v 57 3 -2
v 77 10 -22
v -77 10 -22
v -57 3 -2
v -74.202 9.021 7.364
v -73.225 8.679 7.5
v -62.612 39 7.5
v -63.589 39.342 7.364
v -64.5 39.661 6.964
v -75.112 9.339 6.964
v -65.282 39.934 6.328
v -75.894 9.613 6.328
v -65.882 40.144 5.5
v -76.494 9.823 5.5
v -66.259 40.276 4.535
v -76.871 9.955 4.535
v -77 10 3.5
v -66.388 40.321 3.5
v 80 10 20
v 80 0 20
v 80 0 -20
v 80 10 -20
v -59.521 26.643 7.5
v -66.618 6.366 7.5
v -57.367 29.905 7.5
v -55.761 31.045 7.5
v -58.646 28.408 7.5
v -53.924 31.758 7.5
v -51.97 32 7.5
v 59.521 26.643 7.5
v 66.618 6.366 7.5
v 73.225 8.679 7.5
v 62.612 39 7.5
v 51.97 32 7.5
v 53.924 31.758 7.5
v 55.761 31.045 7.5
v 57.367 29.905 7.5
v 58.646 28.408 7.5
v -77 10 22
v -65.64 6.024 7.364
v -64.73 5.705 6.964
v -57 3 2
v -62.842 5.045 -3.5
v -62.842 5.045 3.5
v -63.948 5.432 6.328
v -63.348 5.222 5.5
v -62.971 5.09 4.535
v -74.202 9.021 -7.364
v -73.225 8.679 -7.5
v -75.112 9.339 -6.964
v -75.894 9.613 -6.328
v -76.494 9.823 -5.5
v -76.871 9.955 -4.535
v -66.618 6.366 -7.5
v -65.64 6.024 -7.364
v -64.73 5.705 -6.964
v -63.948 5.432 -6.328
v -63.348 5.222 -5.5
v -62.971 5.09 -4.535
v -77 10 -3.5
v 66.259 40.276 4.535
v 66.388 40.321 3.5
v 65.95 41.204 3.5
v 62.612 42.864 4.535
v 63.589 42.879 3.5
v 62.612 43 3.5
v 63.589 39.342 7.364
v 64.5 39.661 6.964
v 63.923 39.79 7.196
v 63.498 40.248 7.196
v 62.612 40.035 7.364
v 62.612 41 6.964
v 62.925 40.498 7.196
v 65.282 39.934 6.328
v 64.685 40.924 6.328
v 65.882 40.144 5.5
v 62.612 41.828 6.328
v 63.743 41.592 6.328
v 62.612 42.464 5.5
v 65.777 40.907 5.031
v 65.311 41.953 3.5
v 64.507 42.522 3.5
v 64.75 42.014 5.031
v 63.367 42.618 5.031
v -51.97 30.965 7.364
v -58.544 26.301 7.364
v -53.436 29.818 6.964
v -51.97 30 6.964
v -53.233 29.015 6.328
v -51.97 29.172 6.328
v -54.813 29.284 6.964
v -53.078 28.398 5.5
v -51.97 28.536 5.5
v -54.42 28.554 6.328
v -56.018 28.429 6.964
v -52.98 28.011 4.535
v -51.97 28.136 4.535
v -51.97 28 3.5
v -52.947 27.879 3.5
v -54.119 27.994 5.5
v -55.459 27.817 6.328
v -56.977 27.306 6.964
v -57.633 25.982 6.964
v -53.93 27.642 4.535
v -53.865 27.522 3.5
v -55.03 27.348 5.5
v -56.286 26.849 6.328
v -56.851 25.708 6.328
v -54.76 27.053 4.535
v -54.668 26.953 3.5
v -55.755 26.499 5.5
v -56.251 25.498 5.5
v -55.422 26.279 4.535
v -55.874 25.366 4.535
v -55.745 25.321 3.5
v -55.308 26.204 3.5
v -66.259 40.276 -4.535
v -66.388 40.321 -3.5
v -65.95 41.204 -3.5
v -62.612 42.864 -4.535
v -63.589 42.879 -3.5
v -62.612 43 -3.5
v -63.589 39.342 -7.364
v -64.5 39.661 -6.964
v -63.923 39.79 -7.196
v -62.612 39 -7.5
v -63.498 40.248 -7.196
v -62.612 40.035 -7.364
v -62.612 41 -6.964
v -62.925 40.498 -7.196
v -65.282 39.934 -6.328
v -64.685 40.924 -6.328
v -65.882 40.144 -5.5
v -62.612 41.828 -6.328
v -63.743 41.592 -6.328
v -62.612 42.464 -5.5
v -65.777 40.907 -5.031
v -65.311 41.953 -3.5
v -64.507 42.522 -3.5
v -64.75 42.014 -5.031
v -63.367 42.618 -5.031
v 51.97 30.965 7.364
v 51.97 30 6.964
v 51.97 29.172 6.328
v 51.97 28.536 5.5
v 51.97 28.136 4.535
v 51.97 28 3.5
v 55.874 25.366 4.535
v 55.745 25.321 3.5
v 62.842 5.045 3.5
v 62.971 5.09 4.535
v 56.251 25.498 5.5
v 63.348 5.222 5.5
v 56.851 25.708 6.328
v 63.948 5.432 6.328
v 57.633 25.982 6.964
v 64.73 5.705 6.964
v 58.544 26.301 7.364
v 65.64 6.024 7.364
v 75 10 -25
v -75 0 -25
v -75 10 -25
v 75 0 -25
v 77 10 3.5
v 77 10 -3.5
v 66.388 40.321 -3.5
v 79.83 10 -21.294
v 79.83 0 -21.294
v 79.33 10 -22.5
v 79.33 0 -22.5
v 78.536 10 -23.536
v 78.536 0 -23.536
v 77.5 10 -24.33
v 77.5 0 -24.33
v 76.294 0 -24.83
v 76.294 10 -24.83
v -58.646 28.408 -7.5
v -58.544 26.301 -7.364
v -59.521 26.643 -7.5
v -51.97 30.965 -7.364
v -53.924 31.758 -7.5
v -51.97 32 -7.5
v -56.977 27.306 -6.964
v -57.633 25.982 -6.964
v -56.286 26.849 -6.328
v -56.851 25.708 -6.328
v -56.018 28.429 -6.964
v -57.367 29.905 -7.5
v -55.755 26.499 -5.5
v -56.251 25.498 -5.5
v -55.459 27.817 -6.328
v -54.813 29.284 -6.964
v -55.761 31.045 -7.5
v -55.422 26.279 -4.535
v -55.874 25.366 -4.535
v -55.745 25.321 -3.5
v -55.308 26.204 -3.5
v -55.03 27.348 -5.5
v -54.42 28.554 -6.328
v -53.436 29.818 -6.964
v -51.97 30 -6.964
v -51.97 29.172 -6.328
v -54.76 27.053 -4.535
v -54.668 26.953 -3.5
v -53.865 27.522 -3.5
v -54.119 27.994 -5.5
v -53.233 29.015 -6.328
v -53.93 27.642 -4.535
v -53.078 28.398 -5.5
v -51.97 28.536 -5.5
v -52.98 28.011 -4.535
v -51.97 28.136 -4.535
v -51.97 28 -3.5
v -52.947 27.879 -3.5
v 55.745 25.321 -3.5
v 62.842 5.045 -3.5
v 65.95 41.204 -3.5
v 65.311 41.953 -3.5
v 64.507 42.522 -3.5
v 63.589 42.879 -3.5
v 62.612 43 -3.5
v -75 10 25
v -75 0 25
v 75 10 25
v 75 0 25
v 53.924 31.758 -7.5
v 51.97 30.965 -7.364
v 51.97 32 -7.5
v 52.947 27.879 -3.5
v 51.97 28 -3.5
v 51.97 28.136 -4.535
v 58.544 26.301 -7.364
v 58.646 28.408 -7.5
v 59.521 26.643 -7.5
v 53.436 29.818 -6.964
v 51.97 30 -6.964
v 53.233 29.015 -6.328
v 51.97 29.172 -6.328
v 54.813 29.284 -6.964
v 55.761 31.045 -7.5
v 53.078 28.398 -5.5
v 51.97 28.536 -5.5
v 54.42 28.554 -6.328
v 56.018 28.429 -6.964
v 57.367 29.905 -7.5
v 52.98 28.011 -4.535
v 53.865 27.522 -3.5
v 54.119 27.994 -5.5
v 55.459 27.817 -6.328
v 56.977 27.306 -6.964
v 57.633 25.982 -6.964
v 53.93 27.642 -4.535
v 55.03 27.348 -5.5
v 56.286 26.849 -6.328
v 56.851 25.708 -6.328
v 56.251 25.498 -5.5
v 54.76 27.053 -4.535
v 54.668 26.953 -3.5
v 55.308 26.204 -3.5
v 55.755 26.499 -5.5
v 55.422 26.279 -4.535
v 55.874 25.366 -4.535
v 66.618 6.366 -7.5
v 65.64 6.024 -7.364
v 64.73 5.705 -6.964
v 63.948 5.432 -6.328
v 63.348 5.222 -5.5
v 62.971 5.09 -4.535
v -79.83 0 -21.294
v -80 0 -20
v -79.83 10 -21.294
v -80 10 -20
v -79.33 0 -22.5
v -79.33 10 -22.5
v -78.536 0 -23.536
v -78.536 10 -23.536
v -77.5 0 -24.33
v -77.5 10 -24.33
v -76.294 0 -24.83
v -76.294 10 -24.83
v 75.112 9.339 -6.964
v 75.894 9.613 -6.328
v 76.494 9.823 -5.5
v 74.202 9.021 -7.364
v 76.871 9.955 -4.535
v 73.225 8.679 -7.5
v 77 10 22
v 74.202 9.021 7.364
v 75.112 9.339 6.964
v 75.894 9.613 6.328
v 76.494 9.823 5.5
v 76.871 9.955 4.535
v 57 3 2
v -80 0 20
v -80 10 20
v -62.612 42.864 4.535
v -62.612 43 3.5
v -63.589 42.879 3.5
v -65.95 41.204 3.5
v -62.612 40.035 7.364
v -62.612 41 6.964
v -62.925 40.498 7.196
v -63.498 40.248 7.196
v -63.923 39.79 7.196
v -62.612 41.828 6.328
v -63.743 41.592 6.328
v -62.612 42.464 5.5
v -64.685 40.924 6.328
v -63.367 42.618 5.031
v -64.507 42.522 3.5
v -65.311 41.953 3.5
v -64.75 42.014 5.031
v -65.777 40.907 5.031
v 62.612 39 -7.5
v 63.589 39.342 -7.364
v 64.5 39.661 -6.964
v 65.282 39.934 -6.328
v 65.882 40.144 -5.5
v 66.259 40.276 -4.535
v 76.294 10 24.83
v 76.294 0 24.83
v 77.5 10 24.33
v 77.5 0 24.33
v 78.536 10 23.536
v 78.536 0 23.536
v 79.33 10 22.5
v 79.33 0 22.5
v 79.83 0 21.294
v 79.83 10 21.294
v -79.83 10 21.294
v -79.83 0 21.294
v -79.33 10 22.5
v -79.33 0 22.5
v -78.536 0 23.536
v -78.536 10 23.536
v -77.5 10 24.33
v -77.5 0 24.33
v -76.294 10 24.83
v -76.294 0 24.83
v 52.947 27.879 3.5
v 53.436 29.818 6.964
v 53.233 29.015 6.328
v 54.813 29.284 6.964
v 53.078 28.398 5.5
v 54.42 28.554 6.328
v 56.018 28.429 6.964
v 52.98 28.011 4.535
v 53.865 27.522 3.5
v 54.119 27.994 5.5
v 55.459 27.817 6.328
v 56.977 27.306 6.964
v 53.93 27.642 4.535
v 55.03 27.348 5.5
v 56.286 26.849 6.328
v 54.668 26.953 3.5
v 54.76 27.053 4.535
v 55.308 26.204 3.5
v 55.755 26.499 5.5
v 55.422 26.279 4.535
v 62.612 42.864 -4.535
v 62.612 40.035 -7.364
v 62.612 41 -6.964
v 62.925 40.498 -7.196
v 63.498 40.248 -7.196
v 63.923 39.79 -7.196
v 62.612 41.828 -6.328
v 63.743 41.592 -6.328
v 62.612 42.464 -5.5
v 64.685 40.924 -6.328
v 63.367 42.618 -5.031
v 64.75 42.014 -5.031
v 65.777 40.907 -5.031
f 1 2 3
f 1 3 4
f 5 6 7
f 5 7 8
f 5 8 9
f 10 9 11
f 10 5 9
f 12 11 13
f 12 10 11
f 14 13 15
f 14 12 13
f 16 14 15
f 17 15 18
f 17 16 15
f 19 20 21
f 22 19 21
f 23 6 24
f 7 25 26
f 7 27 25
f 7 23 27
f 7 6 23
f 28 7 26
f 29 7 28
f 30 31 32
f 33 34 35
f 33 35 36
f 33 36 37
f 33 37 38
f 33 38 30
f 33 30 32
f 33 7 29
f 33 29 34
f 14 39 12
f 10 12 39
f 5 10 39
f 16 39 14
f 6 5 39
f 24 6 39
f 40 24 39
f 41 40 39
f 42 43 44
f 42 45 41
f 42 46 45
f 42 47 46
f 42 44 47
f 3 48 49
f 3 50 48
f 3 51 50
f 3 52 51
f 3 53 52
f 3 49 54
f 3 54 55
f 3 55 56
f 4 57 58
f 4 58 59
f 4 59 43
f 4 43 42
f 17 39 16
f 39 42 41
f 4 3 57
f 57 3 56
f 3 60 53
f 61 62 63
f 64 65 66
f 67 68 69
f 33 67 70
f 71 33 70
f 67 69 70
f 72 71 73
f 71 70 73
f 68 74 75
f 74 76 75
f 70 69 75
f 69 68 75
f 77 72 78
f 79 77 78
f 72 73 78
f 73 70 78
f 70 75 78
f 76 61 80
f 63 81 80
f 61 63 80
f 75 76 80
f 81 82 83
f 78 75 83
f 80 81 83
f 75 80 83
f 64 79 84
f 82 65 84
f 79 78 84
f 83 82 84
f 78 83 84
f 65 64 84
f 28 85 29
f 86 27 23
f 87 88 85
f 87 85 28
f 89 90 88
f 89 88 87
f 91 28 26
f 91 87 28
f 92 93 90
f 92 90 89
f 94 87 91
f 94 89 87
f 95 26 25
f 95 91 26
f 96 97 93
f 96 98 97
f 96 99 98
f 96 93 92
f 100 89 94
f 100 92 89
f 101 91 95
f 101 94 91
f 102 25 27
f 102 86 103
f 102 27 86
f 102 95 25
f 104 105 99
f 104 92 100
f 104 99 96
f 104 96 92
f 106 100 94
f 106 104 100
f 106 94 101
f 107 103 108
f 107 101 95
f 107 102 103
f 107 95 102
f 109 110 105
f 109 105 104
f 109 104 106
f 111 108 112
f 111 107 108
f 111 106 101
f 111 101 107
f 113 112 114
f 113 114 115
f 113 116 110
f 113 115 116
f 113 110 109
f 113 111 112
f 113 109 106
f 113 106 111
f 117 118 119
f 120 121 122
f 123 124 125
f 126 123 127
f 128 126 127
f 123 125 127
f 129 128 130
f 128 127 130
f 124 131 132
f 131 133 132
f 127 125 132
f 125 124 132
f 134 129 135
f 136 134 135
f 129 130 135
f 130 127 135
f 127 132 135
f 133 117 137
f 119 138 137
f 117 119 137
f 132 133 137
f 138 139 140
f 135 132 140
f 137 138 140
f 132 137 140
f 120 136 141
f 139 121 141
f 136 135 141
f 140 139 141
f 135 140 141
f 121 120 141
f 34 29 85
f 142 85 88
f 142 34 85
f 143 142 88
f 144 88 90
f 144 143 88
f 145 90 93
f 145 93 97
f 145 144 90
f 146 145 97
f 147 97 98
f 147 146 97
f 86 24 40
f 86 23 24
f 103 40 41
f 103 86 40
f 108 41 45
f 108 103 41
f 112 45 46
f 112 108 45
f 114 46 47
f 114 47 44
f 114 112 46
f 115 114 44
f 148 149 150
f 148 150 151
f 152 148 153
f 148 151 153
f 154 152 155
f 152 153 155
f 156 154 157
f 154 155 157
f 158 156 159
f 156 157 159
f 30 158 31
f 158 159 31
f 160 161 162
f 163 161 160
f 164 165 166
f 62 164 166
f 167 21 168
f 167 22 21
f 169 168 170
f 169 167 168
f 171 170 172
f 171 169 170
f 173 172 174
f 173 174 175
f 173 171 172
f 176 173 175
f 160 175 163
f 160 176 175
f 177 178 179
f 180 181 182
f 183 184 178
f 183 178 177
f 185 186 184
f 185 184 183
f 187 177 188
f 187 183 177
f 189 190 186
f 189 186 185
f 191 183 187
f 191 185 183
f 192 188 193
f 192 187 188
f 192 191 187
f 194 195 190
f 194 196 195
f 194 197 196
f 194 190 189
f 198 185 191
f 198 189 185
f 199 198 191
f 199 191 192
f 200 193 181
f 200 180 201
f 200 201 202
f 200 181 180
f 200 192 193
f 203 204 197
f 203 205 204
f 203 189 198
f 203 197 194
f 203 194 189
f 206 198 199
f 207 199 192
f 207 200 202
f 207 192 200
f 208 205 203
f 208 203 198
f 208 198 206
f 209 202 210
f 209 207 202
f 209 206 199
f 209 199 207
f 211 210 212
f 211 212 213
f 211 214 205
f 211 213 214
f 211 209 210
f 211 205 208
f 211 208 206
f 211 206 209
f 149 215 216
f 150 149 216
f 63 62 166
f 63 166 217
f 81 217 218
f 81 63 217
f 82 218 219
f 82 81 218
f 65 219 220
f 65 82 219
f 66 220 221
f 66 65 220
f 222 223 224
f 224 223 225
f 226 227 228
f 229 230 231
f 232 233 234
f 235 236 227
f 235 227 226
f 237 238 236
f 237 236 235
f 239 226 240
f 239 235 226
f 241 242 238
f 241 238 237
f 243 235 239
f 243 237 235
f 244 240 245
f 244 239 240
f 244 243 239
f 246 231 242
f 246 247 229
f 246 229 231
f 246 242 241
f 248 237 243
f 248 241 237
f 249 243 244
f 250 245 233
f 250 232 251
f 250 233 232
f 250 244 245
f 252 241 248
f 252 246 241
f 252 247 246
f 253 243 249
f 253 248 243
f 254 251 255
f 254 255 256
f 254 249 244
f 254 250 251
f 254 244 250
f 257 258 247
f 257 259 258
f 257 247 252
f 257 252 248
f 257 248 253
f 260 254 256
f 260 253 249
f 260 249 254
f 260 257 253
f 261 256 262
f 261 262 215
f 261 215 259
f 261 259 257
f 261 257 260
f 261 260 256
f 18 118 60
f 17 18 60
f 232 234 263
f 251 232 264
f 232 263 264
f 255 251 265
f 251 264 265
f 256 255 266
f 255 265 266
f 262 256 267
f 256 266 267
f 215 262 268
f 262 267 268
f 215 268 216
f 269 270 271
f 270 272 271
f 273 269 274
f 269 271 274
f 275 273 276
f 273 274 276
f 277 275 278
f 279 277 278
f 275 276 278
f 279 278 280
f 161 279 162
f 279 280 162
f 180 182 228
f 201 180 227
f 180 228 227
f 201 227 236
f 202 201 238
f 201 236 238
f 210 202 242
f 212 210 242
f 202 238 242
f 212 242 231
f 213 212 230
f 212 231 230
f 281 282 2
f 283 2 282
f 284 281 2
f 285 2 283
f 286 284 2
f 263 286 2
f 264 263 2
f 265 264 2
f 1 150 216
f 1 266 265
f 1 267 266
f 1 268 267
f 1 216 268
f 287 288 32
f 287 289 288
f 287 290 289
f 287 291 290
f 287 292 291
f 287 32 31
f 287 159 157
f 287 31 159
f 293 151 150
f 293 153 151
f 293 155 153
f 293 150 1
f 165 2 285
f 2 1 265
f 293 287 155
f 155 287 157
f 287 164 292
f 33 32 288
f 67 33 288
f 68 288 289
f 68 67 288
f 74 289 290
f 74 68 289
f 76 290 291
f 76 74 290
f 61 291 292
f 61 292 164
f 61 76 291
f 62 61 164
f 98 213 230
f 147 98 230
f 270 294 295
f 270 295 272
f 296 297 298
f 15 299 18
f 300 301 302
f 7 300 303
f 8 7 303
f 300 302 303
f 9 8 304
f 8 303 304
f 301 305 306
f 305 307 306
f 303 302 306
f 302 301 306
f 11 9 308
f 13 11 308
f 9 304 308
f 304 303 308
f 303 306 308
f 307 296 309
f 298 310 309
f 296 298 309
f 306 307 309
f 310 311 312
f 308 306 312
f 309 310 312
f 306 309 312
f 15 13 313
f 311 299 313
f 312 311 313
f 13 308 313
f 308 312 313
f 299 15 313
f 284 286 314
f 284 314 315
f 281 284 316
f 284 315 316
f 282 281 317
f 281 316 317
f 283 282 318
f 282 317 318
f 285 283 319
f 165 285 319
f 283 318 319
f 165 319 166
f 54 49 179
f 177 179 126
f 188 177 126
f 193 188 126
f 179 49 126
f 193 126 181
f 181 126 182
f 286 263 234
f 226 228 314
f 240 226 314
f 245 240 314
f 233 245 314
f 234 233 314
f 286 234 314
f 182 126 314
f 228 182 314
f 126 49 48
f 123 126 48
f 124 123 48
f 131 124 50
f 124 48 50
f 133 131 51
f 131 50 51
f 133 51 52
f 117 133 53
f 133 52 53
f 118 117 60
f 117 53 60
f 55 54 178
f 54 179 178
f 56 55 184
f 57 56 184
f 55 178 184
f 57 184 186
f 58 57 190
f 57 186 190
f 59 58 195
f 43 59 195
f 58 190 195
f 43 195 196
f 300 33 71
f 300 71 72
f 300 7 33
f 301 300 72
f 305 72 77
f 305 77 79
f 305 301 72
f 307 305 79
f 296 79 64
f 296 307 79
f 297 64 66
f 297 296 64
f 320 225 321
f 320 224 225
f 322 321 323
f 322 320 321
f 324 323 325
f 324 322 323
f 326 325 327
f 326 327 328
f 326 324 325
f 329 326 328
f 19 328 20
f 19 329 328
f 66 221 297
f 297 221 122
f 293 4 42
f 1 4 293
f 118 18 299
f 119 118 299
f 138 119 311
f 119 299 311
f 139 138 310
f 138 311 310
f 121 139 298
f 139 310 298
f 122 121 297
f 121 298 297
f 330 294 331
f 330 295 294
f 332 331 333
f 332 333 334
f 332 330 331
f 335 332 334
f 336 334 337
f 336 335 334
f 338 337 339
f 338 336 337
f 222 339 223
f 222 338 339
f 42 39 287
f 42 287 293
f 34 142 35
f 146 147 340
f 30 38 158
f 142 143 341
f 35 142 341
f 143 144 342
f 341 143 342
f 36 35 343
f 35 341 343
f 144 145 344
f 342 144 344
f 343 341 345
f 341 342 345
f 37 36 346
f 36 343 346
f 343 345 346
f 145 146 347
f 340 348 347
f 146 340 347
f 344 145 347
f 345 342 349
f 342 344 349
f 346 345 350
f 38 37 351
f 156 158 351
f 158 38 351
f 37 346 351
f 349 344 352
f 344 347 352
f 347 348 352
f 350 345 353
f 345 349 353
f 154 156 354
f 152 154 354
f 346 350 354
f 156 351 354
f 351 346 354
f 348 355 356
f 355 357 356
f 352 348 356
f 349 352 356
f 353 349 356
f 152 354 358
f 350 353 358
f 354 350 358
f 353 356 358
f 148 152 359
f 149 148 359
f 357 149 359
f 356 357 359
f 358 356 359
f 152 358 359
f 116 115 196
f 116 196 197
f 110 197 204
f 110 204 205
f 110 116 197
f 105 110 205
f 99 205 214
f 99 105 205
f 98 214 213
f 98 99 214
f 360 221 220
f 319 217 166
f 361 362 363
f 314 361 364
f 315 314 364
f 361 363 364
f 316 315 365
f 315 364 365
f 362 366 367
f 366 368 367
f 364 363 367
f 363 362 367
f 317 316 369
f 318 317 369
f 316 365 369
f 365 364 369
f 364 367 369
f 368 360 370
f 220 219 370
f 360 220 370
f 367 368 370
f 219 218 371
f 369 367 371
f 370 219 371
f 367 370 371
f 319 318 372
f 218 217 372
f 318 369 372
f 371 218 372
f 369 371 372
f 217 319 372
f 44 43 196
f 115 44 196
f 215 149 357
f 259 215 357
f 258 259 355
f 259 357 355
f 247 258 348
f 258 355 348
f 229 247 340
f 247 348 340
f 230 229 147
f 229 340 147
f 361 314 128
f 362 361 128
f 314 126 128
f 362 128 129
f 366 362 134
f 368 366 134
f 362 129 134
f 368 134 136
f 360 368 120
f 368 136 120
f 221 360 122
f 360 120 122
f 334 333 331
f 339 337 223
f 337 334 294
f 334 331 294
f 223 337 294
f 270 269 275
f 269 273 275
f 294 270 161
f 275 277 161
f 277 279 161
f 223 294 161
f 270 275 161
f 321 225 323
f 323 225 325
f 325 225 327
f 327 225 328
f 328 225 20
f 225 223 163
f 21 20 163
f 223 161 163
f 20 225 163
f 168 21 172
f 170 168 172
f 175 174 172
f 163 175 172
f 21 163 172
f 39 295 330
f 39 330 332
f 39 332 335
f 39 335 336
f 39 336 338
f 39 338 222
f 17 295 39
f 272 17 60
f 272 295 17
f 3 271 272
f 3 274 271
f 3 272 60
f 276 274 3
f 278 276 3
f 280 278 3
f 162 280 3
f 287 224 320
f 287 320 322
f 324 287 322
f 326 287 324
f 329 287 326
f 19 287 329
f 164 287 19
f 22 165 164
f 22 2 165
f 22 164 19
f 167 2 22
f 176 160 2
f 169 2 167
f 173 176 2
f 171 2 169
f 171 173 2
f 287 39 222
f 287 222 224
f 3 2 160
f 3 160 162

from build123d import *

# Parameters (mm, degrees)
SKETCH1_W                = 160
SKETCH1_H                = 50
BOSS_EXTRUDE1_DEPTH      = 10
SHELL3_T                 = -3
FILLET1_R                = 5
CHAMFER1_SIZE            = 7
CHAMFER1_SIZE_2          = 20
BOSS_EXTRUDE2_DEPTH      = 7.5
BOSS_EXTRUDE2_DEPTH_BACK = 7.5
FILLET2_R                = 4


with BuildPart() as part:
    # Sketch1 → Boss-Extrude1 (new body)
    with BuildSketch(Plane(origin=(0, 0, 0), x_dir=(1, 0, 0), z_dir=(0, 1, 0))):
        Rectangle(SKETCH1_W, SKETCH1_H)
    extrude(amount=BOSS_EXTRUDE1_DEPTH)

    # Shell3
    shell3_openings = [part.faces().sort_by_distance(p)[0] for p in [
        (0, 10, 0),
    ]]
    offset(amount=SHELL3_T, openings=shell3_openings, kind=Kind.INTERSECTION)

    # Fillet1
    fillet1_edges = [part.edges().sort_by_distance(p)[0] for p in [
        (80, 5, 25),
        (-80, 5, 25),
        (-80, 5, -25),
        (80, 5, -25),
    ]]
    fillet(fillet1_edges, radius=FILLET1_R)

    # Chamfer1
    # the kernel refuses this chamfer: 20, 7 mm, written as the material it adds along each edge
    with BuildSketch(Plane(origin=(-77, 3, 22), x_dir=(0, 0.9946410899892074, 0.10338811394488961), z_dir=(1, 0, 0))) as chamfer1_piece_1_section:
        Polygon((CHAMFER1_SIZE * 0.994641089989, -CHAMFER1_SIZE * 0.103388113945), (-CHAMFER1_SIZE_2 * 0.103388113945, -CHAMFER1_SIZE_2 * 0.994641089989), (0, 0), align=None)
    chamfer1_piece_1 = extrude(amount=154, mode=Mode.PRIVATE)
    chamfer1_piece_1 = split(chamfer1_piece_1, bisect_by=Plane(origin=(0, 10, 15.125023974), z_dir=(0, -1, 0)), keep=Keep.TOP, mode=Mode.PRIVATE)
    add(chamfer1_piece_1)
    with BuildSketch(Plane(origin=(-77, 3, -22), x_dir=(-0.10338811394489059, 0.9946410899892072, 0), z_dir=(0, 0, 1))) as chamfer1_piece_2_section:
        Polygon((CHAMFER1_SIZE * 0.994641089989, -CHAMFER1_SIZE * 0.103388113945), (-CHAMFER1_SIZE_2 * 0.103388113945, -CHAMFER1_SIZE_2 * 0.994641089989), (0, 0), align=None)
    chamfer1_piece_2 = extrude(amount=44, mode=Mode.PRIVATE)
    chamfer1_piece_2 = split(chamfer1_piece_2, bisect_by=Plane(origin=(-70.125023974, 10, 0), z_dir=(0, -1, 0)), keep=Keep.TOP, mode=Mode.PRIVATE)
    add(chamfer1_piece_2)
    with BuildSketch(Plane(origin=(77, 3, -22), x_dir=(0, 0.9946410899892074, -0.10338811394488961), z_dir=(-1, 0, 0))) as chamfer1_piece_3_section:
        Polygon((CHAMFER1_SIZE * 0.994641089989, -CHAMFER1_SIZE * 0.103388113945), (-CHAMFER1_SIZE_2 * 0.103388113945, -CHAMFER1_SIZE_2 * 0.994641089989), (0, 0), align=None)
    chamfer1_piece_3 = extrude(amount=154, mode=Mode.PRIVATE)
    chamfer1_piece_3 = split(chamfer1_piece_3, bisect_by=Plane(origin=(0, 10, -15.125023974), z_dir=(0, -1, 0)), keep=Keep.TOP, mode=Mode.PRIVATE)
    add(chamfer1_piece_3)
    with BuildSketch(Plane(origin=(77, 3, 22), x_dir=(0.10338811394489059, 0.9946410899892072, 0), z_dir=(0, 0, -1))) as chamfer1_piece_4_section:
        Polygon((CHAMFER1_SIZE * 0.994641089989, -CHAMFER1_SIZE * 0.103388113945), (-CHAMFER1_SIZE_2 * 0.103388113945, -CHAMFER1_SIZE_2 * 0.994641089989), (0, 0), align=None)
    chamfer1_piece_4 = extrude(amount=44, mode=Mode.PRIVATE)
    chamfer1_piece_4 = split(chamfer1_piece_4, bisect_by=Plane(origin=(70.125023974, 10, 0), z_dir=(0, -1, 0)), keep=Keep.TOP, mode=Mode.PRIVATE)
    add(chamfer1_piece_4)

    # Sketch2 → Boss-Extrude2 (add, two sides: drawn at the far end of the back side and taken through both)
    with BuildSketch(Plane.XY.offset(-BOSS_EXTRUDE2_DEPTH_BACK)):
        Polygon((-65.45, 43), (-77, 10), (-62.842124655, 5.044743629), (-54.807784925, 28), (54.807784925, 28), (62.842124655, 5.044743629), (77, 10), (65.45, 43), align=None)
    extrude(amount=BOSS_EXTRUDE2_DEPTH + BOSS_EXTRUDE2_DEPTH_BACK)

    # Fillet2
    fillet2_edges = [part.edges().sort_by_distance(p)[0] for p in [
        (54.807784925, 28, 0),
        (0, 28, -7.5),
        (-54.807784925, 28, 0),
        (-58.82495479, 16.522371815, -7.5),
        (-71.225, 26.5, 7.5),
        (-65.45, 43, 0),
        (0, 43, 7.5),
        (65.45, 43, 0),
        (71.225, 26.5, 7.5),
        (58.82495479, 16.522371815, -7.5),
        (-71.225, 26.5, -7.5),
        (0, 43, -7.5),
        (71.225, 26.5, -7.5),
        (0, 28, 7.5),
        (58.82495479, 16.522371815, 7.5),
        (-58.82495479, 16.522371815, 7.5),
    ]]
    fillet(fillet2_edges, radius=FILLET2_R)


solid = part.part
